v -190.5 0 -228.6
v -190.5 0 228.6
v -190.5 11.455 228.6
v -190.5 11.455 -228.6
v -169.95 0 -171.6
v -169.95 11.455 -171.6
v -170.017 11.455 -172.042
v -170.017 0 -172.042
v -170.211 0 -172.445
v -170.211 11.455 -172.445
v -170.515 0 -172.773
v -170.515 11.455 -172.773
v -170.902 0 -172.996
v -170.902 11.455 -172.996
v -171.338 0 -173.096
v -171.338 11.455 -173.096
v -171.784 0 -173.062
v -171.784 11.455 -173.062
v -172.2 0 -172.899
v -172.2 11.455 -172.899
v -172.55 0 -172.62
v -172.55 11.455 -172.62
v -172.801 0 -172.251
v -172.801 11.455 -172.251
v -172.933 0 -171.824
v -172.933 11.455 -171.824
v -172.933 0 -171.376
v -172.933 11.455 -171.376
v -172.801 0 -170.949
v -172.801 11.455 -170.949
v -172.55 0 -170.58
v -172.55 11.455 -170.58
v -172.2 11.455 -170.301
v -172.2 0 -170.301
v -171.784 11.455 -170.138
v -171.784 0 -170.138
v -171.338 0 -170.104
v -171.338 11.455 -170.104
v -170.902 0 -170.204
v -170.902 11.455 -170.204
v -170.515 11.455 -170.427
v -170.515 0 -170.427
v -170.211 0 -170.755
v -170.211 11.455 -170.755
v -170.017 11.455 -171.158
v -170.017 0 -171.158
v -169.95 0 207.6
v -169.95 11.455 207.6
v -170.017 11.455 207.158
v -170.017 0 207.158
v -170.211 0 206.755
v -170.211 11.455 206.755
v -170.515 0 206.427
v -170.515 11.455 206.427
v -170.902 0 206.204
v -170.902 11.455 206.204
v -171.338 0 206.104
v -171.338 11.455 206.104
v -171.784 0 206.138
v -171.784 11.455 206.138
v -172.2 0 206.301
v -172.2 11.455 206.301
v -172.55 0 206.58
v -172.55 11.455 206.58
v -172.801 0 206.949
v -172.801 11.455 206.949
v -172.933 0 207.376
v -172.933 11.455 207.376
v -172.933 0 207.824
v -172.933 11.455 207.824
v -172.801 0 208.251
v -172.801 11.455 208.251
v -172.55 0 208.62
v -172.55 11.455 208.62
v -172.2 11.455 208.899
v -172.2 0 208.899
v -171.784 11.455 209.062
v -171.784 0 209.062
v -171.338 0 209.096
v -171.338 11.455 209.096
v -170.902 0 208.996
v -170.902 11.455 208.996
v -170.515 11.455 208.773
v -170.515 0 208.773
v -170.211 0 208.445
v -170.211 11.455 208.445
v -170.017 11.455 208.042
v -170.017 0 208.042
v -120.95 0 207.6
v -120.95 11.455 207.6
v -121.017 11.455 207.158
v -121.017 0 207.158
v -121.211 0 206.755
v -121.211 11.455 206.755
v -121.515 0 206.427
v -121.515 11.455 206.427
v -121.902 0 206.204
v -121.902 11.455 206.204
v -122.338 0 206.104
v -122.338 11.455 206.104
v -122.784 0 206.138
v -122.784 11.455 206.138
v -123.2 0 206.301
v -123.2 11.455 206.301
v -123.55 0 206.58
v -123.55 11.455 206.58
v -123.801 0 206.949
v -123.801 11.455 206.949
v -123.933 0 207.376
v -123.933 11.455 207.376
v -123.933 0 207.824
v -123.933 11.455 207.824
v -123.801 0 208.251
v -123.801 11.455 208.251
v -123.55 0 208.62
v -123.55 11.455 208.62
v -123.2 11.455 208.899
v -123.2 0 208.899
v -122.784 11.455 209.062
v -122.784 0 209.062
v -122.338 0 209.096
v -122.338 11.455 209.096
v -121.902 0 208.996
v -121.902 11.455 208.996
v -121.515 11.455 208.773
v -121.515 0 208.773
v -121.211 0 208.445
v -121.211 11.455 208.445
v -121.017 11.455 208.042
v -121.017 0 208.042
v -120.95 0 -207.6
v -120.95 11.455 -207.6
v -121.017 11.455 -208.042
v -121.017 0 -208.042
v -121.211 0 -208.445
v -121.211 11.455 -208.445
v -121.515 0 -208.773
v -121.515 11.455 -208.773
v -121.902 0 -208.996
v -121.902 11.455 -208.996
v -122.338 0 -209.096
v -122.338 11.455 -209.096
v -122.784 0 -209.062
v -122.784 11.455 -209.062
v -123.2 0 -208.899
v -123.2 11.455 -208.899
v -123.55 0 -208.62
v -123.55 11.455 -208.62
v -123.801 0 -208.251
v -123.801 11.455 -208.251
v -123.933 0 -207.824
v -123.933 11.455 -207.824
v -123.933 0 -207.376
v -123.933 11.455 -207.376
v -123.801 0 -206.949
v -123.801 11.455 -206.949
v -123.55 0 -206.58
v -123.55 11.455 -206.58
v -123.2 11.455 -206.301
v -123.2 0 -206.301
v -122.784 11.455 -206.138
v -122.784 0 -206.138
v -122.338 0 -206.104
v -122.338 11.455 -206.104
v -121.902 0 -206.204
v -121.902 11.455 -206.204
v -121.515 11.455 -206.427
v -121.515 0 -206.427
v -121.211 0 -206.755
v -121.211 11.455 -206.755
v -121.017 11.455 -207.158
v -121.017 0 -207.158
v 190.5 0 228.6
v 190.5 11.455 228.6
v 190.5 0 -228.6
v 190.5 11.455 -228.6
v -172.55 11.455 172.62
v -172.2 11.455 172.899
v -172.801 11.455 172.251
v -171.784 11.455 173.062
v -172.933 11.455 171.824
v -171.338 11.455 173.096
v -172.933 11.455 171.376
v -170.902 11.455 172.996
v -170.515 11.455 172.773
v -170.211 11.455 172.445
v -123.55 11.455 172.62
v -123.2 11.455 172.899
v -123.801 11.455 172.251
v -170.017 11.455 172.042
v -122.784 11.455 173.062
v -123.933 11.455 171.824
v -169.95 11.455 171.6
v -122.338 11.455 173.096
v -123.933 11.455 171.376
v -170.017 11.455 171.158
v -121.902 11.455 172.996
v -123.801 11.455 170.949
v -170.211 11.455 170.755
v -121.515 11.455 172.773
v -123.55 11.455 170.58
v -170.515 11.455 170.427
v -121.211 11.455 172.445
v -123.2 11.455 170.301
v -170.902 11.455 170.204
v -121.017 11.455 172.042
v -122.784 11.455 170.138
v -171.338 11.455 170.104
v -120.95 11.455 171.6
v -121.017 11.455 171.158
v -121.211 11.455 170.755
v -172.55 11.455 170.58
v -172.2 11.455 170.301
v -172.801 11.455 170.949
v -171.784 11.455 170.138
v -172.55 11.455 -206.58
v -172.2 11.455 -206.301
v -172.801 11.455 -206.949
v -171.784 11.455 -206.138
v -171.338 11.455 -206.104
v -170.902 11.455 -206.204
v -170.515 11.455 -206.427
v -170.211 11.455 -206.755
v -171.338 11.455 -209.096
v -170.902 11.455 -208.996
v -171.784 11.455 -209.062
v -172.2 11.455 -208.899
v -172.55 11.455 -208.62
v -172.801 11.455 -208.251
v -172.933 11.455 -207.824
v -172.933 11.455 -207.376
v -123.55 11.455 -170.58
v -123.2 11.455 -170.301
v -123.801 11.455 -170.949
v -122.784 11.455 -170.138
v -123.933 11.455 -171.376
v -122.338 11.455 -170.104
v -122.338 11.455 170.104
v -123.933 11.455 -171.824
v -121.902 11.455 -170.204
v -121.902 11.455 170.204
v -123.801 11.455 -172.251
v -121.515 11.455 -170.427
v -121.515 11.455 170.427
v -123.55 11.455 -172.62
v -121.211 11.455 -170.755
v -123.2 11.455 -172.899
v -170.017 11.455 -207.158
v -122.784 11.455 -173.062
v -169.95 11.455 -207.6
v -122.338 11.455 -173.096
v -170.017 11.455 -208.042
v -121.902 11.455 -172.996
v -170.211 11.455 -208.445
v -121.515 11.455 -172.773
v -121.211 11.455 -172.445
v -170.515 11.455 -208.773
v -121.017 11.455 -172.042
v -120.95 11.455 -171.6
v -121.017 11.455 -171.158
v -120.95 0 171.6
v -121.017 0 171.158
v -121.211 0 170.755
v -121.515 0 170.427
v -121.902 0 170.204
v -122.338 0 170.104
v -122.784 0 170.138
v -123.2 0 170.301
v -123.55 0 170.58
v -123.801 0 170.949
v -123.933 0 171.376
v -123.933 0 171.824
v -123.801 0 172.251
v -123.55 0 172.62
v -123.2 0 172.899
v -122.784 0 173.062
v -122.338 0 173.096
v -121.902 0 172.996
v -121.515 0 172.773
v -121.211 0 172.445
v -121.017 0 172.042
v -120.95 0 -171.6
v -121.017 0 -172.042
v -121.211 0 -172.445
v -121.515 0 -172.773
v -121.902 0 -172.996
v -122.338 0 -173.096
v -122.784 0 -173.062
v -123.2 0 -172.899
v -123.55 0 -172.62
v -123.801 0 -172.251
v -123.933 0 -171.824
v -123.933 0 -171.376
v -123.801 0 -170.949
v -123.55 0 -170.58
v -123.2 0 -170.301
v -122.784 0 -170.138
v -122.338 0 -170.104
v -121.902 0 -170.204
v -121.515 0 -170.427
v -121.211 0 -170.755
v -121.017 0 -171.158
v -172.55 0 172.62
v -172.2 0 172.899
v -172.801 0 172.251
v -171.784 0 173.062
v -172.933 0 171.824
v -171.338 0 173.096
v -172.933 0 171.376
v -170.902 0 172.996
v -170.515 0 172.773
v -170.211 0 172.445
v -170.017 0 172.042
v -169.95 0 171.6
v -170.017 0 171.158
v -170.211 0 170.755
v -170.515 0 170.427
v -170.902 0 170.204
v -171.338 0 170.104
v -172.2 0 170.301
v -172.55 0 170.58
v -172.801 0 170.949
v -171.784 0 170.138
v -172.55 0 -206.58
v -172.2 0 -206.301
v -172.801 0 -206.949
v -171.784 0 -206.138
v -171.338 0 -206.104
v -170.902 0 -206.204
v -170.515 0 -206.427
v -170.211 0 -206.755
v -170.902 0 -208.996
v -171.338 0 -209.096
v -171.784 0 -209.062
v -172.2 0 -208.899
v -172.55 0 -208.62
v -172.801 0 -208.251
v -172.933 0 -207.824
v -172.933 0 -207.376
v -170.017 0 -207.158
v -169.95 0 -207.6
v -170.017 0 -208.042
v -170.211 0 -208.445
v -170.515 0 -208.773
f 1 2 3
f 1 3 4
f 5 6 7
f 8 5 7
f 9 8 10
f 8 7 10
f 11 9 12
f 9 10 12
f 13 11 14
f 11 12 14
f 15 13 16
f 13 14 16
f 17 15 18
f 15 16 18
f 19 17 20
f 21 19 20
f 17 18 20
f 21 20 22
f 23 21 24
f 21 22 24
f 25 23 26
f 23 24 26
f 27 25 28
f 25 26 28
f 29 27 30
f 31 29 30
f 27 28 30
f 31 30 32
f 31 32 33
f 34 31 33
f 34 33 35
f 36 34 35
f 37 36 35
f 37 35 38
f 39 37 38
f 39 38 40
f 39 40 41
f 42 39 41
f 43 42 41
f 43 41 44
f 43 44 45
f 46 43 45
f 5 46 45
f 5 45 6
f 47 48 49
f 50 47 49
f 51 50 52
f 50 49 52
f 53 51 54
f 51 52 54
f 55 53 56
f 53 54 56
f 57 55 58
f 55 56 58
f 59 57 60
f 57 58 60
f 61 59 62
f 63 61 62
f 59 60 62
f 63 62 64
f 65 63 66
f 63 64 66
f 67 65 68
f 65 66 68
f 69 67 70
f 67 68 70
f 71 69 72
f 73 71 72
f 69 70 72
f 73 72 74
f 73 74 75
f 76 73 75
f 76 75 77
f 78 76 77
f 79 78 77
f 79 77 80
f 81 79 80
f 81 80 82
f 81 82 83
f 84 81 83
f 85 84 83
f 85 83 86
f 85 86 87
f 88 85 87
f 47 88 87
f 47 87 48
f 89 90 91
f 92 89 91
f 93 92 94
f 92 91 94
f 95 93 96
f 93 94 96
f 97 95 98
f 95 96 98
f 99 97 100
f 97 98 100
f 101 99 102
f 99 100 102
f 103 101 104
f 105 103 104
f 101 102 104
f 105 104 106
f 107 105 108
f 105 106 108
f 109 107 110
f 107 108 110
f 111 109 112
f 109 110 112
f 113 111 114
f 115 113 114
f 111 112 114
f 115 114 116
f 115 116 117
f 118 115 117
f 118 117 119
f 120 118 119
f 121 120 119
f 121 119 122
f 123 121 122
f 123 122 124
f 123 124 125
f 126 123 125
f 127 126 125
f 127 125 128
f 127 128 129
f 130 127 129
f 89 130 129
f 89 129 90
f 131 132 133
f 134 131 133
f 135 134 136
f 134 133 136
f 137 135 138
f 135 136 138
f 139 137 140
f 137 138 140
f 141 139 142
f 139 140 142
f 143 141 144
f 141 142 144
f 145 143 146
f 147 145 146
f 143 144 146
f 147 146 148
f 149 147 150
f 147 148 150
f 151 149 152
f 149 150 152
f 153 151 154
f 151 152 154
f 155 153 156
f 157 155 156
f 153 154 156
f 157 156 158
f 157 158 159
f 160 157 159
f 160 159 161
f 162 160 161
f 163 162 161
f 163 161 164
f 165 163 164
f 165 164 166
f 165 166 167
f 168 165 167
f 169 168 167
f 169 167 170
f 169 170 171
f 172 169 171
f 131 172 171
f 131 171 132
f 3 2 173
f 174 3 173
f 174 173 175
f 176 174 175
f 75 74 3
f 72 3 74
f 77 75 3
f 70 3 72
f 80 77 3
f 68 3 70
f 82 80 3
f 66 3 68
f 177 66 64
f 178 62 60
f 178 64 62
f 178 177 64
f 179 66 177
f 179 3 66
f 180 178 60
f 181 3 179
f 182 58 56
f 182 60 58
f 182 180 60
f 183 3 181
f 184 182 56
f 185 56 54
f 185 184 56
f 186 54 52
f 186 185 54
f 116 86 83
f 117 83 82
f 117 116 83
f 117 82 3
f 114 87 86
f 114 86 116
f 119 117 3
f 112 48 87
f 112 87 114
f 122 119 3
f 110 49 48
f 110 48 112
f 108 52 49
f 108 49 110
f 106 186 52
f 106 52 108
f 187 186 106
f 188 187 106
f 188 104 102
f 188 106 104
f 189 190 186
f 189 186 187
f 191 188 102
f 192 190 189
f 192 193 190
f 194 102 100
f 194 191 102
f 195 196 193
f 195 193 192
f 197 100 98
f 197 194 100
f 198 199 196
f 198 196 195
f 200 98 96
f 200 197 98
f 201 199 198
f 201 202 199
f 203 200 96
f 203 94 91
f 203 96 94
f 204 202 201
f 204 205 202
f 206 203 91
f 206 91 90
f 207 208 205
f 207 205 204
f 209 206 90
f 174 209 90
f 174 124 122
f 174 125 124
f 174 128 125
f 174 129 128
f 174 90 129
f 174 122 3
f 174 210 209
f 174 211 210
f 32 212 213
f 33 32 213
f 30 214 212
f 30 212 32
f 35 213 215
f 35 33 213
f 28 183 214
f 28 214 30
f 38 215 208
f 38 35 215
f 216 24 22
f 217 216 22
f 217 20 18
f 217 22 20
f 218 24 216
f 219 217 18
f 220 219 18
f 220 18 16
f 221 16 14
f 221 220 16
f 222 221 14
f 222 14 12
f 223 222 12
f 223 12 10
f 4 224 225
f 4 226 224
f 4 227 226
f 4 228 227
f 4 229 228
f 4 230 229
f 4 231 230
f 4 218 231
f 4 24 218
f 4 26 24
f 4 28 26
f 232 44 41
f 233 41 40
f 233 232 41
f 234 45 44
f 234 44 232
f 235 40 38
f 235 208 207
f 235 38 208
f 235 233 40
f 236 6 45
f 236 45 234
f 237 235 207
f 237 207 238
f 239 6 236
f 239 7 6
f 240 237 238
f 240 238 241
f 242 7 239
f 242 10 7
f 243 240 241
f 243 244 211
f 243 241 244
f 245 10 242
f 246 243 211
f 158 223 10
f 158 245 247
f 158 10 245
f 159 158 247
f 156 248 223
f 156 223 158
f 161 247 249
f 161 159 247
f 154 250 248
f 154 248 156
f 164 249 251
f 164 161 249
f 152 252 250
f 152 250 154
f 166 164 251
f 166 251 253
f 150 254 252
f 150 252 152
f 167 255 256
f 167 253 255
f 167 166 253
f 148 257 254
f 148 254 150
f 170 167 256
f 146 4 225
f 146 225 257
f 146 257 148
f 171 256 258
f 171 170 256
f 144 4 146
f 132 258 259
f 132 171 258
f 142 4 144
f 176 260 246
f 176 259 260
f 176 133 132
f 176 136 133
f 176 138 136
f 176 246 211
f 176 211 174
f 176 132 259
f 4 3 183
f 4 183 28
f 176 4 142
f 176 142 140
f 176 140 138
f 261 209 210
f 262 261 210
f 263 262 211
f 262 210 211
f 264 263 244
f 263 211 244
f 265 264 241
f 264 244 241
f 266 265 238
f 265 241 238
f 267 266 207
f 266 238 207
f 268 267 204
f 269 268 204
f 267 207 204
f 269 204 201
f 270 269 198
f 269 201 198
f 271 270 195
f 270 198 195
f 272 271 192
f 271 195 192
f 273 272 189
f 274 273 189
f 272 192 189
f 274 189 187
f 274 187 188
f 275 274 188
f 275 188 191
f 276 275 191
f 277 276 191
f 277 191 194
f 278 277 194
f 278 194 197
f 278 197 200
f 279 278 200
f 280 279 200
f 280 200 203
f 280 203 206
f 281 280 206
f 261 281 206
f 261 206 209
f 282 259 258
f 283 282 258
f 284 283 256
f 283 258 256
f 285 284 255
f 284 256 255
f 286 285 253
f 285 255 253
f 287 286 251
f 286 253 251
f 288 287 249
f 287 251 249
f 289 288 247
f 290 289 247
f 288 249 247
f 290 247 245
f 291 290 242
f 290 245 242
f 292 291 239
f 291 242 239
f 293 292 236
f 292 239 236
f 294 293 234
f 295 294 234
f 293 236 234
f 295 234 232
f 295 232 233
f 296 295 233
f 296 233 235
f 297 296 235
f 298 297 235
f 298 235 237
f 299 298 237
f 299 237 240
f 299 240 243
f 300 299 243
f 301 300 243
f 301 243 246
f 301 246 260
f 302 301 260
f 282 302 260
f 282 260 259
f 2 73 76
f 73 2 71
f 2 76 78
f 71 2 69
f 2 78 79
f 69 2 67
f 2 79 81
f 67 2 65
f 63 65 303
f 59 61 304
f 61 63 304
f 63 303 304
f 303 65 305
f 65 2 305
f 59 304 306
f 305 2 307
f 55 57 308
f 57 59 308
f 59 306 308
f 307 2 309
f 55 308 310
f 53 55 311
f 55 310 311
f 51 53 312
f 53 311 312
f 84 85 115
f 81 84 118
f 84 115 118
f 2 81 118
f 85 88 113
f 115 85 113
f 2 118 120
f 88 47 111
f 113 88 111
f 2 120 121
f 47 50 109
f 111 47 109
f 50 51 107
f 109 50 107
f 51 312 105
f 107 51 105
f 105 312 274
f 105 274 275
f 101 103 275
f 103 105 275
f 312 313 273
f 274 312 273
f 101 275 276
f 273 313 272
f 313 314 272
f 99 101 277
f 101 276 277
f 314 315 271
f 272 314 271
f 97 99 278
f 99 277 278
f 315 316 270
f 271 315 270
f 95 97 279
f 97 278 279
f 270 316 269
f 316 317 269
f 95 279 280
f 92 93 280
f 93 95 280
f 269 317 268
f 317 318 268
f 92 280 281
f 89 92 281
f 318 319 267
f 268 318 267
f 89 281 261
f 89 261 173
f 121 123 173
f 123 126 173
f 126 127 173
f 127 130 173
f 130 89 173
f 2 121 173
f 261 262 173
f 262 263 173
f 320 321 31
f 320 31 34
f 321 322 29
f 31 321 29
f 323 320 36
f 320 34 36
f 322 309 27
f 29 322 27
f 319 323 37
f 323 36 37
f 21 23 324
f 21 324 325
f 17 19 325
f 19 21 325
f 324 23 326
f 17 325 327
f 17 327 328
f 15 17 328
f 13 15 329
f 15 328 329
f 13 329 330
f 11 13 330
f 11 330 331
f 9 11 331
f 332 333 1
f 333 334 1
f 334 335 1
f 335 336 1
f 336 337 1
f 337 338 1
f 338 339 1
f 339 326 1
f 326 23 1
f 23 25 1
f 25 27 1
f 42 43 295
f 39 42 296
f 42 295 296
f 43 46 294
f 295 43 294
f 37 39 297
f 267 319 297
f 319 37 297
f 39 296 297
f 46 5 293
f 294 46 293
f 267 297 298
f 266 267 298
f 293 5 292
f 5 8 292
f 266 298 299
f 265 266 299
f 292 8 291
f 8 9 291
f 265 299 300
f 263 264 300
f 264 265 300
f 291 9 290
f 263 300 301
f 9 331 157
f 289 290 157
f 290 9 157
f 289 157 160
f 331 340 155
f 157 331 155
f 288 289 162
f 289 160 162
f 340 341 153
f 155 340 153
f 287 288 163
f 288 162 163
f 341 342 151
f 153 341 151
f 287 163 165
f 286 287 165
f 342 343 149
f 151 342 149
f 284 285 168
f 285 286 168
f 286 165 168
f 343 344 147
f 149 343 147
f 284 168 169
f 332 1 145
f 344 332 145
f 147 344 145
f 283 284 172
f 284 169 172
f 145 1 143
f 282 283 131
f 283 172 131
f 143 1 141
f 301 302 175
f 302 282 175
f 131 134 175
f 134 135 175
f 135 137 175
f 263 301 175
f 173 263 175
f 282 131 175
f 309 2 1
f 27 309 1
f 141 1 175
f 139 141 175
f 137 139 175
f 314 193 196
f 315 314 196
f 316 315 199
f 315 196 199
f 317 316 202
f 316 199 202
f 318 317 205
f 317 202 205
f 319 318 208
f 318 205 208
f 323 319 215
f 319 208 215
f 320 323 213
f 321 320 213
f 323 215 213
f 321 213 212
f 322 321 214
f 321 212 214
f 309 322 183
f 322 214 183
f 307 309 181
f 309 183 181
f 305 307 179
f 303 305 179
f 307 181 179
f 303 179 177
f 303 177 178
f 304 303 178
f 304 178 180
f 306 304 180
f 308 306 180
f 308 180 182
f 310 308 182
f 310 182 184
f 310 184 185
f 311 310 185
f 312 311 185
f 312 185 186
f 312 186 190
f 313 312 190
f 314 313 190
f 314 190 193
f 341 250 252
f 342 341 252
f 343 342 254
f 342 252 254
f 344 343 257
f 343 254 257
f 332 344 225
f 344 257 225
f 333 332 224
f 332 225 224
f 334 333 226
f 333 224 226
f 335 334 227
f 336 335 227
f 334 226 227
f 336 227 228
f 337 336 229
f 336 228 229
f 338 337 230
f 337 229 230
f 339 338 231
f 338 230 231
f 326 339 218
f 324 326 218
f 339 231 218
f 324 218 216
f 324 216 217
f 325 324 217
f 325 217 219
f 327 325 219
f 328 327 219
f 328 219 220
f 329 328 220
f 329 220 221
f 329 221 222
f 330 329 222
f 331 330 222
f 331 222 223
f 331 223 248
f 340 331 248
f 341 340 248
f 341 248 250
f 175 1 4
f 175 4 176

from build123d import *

# Parameters (mm, degrees)
SKETCH1_W           = 381
SKETCH1_H           = 457.2
BOSS_EXTRUDE1_DEPTH = 11.4554
SKETCH3_R           = 1.5
CUT_EXTRUDE1_DEPTH  = 12.4554


with BuildPart() as part:
    # Sketch1 → Boss-Extrude1 (new body)
    with BuildSketch(Plane(origin=(0, 0, 0), x_dir=(1, 0, 0), z_dir=(0, 1, 0))):
        Rectangle(SKETCH1_W, SKETCH1_H)
    extrude(amount=BOSS_EXTRUDE1_DEPTH)

    # Sketch3 → Cut-Extrude1 (cut, through all)
    with BuildSketch(Plane(origin=(0, 11.4554, 0), x_dir=(1, 0, 0), z_dir=(0, 1, 0))):
        with Locations((-122.45, 207.6)):
            Circle(SKETCH3_R)
        with Locations((-171.45, 207.6)):
            Circle(SKETCH3_R)
        with Locations((-171.45, 171.6)):
            Circle(SKETCH3_R)
        with Locations((-122.45, 171.6)):
            Circle(SKETCH3_R)
        with Locations((-122.45, -171.6)):
            Circle(SKETCH3_R)
        with Locations((-171.45, -171.6)):
            Circle(SKETCH3_R)
        with Locations((-171.45, -207.6)):
            Circle(SKETCH3_R)
        with Locations((-122.45, -207.6)):
            Circle(SKETCH3_R)
    extrude(amount=-CUT_EXTRUDE1_DEPTH, mode=Mode.SUBTRACT)


solid = part.part
